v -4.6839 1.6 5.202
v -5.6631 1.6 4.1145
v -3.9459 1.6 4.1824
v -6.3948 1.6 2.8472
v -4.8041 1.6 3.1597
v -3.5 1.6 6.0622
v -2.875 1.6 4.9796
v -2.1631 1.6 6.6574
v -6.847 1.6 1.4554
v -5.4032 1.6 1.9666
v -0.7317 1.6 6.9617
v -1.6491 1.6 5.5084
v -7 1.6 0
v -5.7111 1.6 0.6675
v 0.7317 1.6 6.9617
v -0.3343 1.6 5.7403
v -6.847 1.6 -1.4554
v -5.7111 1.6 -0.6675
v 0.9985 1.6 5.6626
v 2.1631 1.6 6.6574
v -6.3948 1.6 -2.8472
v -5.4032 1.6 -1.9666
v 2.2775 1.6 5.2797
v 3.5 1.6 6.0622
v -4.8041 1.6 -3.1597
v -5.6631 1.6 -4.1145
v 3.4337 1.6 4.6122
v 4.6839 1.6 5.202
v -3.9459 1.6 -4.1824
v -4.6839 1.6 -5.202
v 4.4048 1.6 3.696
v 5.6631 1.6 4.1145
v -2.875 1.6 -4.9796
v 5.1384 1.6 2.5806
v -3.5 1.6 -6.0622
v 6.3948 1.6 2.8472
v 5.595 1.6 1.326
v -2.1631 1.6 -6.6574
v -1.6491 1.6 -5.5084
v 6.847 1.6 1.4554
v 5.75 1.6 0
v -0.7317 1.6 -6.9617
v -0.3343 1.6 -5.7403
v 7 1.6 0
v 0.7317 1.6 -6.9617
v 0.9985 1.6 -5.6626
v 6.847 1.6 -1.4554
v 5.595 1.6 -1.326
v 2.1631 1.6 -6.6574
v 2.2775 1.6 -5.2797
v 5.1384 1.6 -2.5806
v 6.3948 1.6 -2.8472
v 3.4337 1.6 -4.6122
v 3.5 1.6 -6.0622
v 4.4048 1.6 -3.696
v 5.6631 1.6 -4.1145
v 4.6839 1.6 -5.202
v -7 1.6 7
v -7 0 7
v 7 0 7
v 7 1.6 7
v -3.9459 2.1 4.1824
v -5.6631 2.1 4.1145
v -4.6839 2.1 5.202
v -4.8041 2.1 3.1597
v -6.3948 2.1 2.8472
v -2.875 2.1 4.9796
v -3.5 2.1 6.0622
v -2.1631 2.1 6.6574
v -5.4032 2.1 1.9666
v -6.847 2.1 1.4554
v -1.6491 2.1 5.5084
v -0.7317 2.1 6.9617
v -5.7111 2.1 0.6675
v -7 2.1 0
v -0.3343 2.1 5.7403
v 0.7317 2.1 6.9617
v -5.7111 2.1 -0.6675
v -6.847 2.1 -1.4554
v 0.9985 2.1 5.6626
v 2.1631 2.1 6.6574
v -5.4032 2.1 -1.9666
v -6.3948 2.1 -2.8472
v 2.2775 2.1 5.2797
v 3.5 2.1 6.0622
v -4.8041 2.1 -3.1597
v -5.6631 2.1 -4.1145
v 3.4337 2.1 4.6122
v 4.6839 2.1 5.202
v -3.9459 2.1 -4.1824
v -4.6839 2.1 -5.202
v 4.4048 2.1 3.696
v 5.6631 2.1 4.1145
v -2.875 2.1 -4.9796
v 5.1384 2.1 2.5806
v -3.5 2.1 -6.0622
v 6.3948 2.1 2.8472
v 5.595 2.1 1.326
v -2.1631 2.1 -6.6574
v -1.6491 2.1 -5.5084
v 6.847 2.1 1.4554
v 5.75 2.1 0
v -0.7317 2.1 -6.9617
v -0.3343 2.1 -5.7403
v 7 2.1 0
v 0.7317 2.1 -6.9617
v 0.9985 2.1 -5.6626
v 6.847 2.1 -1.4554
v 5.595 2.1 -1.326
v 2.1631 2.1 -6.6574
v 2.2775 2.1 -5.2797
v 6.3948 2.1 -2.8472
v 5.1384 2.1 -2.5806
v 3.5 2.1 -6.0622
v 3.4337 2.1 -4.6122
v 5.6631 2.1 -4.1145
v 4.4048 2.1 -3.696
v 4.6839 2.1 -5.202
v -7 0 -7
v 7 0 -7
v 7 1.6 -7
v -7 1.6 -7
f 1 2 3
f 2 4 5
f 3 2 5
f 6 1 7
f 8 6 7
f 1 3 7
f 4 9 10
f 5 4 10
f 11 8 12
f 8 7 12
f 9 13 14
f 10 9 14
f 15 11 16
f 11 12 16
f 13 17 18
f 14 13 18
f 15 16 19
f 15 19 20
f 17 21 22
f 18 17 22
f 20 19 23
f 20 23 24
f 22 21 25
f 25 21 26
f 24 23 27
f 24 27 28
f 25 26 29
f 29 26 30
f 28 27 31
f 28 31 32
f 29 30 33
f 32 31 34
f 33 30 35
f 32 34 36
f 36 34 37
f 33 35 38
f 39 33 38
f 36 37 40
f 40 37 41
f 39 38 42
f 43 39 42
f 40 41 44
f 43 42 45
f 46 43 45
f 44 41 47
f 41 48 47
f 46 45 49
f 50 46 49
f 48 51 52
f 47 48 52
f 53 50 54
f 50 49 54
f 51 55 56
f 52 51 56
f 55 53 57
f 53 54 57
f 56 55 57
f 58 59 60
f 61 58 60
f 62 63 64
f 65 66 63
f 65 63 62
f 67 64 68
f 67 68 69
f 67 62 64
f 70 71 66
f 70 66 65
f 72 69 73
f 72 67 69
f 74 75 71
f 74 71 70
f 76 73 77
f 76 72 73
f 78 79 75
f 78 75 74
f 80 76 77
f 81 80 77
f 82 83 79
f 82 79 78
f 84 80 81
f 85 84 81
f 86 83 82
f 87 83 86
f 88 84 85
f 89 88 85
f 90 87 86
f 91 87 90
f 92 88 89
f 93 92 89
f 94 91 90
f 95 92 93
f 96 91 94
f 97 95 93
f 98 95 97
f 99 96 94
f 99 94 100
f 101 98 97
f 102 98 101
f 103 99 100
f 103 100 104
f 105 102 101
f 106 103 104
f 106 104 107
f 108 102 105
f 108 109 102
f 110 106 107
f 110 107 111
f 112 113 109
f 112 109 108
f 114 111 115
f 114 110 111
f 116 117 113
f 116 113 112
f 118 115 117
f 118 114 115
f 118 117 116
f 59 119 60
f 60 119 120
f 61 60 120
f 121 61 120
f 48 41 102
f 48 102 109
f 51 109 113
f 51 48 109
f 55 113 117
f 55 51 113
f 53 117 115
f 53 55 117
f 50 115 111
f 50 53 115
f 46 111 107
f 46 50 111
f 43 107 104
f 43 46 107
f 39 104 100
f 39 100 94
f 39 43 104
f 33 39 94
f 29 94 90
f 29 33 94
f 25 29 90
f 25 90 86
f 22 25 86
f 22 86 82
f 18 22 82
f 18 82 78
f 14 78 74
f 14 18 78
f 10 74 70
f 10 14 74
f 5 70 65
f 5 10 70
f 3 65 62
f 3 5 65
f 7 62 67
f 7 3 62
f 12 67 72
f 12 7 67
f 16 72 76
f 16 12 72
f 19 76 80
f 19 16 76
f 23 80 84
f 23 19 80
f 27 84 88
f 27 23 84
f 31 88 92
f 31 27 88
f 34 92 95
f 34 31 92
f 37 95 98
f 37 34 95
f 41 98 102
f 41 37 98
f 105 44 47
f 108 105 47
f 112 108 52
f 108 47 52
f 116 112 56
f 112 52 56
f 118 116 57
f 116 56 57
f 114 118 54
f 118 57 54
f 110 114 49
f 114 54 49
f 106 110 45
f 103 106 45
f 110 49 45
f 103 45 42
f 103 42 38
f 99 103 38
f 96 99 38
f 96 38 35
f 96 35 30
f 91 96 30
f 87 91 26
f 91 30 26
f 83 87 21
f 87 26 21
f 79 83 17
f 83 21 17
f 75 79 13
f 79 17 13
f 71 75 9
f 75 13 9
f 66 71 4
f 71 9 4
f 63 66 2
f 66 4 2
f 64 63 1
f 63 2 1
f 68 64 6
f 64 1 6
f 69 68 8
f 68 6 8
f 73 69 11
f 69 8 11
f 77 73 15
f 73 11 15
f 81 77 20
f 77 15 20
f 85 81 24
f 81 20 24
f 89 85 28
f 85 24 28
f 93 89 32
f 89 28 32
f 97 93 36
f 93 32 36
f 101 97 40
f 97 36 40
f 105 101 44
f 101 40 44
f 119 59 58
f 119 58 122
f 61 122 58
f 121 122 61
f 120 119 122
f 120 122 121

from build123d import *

# Parameters (mm, degrees)
SKETCH1_W           = 14
SKETCH1_H           = 14
BOSS_EXTRUDE1_DEPTH = 1.6
SKETCH2_R           = 7
SKETCH2_R_2         = 5.75
BOSS_EXTRUDE2_DEPTH = 0.5


with BuildPart() as part:
    # Sketch1 → Boss-Extrude1 (new body)
    with BuildSketch(Plane(origin=(0, 0, 0), x_dir=(1, 0, 0), z_dir=(0, 1, 0))):
        Rectangle(SKETCH1_W, SKETCH1_H)
    extrude(amount=BOSS_EXTRUDE1_DEPTH)


with BuildPart() as body_2:
    # Sketch2 → Boss-Extrude2 (new body)
    with BuildSketch(Plane(origin=(0, 1.6, 0), x_dir=(1, 0, 0), z_dir=(0, 1, 0))):
        Circle(SKETCH2_R)
        Circle(SKETCH2_R_2, mode=Mode.SUBTRACT)
    extrude(amount=BOSS_EXTRUDE2_DEPTH)


solid = Compound([part.part, body_2.part])
